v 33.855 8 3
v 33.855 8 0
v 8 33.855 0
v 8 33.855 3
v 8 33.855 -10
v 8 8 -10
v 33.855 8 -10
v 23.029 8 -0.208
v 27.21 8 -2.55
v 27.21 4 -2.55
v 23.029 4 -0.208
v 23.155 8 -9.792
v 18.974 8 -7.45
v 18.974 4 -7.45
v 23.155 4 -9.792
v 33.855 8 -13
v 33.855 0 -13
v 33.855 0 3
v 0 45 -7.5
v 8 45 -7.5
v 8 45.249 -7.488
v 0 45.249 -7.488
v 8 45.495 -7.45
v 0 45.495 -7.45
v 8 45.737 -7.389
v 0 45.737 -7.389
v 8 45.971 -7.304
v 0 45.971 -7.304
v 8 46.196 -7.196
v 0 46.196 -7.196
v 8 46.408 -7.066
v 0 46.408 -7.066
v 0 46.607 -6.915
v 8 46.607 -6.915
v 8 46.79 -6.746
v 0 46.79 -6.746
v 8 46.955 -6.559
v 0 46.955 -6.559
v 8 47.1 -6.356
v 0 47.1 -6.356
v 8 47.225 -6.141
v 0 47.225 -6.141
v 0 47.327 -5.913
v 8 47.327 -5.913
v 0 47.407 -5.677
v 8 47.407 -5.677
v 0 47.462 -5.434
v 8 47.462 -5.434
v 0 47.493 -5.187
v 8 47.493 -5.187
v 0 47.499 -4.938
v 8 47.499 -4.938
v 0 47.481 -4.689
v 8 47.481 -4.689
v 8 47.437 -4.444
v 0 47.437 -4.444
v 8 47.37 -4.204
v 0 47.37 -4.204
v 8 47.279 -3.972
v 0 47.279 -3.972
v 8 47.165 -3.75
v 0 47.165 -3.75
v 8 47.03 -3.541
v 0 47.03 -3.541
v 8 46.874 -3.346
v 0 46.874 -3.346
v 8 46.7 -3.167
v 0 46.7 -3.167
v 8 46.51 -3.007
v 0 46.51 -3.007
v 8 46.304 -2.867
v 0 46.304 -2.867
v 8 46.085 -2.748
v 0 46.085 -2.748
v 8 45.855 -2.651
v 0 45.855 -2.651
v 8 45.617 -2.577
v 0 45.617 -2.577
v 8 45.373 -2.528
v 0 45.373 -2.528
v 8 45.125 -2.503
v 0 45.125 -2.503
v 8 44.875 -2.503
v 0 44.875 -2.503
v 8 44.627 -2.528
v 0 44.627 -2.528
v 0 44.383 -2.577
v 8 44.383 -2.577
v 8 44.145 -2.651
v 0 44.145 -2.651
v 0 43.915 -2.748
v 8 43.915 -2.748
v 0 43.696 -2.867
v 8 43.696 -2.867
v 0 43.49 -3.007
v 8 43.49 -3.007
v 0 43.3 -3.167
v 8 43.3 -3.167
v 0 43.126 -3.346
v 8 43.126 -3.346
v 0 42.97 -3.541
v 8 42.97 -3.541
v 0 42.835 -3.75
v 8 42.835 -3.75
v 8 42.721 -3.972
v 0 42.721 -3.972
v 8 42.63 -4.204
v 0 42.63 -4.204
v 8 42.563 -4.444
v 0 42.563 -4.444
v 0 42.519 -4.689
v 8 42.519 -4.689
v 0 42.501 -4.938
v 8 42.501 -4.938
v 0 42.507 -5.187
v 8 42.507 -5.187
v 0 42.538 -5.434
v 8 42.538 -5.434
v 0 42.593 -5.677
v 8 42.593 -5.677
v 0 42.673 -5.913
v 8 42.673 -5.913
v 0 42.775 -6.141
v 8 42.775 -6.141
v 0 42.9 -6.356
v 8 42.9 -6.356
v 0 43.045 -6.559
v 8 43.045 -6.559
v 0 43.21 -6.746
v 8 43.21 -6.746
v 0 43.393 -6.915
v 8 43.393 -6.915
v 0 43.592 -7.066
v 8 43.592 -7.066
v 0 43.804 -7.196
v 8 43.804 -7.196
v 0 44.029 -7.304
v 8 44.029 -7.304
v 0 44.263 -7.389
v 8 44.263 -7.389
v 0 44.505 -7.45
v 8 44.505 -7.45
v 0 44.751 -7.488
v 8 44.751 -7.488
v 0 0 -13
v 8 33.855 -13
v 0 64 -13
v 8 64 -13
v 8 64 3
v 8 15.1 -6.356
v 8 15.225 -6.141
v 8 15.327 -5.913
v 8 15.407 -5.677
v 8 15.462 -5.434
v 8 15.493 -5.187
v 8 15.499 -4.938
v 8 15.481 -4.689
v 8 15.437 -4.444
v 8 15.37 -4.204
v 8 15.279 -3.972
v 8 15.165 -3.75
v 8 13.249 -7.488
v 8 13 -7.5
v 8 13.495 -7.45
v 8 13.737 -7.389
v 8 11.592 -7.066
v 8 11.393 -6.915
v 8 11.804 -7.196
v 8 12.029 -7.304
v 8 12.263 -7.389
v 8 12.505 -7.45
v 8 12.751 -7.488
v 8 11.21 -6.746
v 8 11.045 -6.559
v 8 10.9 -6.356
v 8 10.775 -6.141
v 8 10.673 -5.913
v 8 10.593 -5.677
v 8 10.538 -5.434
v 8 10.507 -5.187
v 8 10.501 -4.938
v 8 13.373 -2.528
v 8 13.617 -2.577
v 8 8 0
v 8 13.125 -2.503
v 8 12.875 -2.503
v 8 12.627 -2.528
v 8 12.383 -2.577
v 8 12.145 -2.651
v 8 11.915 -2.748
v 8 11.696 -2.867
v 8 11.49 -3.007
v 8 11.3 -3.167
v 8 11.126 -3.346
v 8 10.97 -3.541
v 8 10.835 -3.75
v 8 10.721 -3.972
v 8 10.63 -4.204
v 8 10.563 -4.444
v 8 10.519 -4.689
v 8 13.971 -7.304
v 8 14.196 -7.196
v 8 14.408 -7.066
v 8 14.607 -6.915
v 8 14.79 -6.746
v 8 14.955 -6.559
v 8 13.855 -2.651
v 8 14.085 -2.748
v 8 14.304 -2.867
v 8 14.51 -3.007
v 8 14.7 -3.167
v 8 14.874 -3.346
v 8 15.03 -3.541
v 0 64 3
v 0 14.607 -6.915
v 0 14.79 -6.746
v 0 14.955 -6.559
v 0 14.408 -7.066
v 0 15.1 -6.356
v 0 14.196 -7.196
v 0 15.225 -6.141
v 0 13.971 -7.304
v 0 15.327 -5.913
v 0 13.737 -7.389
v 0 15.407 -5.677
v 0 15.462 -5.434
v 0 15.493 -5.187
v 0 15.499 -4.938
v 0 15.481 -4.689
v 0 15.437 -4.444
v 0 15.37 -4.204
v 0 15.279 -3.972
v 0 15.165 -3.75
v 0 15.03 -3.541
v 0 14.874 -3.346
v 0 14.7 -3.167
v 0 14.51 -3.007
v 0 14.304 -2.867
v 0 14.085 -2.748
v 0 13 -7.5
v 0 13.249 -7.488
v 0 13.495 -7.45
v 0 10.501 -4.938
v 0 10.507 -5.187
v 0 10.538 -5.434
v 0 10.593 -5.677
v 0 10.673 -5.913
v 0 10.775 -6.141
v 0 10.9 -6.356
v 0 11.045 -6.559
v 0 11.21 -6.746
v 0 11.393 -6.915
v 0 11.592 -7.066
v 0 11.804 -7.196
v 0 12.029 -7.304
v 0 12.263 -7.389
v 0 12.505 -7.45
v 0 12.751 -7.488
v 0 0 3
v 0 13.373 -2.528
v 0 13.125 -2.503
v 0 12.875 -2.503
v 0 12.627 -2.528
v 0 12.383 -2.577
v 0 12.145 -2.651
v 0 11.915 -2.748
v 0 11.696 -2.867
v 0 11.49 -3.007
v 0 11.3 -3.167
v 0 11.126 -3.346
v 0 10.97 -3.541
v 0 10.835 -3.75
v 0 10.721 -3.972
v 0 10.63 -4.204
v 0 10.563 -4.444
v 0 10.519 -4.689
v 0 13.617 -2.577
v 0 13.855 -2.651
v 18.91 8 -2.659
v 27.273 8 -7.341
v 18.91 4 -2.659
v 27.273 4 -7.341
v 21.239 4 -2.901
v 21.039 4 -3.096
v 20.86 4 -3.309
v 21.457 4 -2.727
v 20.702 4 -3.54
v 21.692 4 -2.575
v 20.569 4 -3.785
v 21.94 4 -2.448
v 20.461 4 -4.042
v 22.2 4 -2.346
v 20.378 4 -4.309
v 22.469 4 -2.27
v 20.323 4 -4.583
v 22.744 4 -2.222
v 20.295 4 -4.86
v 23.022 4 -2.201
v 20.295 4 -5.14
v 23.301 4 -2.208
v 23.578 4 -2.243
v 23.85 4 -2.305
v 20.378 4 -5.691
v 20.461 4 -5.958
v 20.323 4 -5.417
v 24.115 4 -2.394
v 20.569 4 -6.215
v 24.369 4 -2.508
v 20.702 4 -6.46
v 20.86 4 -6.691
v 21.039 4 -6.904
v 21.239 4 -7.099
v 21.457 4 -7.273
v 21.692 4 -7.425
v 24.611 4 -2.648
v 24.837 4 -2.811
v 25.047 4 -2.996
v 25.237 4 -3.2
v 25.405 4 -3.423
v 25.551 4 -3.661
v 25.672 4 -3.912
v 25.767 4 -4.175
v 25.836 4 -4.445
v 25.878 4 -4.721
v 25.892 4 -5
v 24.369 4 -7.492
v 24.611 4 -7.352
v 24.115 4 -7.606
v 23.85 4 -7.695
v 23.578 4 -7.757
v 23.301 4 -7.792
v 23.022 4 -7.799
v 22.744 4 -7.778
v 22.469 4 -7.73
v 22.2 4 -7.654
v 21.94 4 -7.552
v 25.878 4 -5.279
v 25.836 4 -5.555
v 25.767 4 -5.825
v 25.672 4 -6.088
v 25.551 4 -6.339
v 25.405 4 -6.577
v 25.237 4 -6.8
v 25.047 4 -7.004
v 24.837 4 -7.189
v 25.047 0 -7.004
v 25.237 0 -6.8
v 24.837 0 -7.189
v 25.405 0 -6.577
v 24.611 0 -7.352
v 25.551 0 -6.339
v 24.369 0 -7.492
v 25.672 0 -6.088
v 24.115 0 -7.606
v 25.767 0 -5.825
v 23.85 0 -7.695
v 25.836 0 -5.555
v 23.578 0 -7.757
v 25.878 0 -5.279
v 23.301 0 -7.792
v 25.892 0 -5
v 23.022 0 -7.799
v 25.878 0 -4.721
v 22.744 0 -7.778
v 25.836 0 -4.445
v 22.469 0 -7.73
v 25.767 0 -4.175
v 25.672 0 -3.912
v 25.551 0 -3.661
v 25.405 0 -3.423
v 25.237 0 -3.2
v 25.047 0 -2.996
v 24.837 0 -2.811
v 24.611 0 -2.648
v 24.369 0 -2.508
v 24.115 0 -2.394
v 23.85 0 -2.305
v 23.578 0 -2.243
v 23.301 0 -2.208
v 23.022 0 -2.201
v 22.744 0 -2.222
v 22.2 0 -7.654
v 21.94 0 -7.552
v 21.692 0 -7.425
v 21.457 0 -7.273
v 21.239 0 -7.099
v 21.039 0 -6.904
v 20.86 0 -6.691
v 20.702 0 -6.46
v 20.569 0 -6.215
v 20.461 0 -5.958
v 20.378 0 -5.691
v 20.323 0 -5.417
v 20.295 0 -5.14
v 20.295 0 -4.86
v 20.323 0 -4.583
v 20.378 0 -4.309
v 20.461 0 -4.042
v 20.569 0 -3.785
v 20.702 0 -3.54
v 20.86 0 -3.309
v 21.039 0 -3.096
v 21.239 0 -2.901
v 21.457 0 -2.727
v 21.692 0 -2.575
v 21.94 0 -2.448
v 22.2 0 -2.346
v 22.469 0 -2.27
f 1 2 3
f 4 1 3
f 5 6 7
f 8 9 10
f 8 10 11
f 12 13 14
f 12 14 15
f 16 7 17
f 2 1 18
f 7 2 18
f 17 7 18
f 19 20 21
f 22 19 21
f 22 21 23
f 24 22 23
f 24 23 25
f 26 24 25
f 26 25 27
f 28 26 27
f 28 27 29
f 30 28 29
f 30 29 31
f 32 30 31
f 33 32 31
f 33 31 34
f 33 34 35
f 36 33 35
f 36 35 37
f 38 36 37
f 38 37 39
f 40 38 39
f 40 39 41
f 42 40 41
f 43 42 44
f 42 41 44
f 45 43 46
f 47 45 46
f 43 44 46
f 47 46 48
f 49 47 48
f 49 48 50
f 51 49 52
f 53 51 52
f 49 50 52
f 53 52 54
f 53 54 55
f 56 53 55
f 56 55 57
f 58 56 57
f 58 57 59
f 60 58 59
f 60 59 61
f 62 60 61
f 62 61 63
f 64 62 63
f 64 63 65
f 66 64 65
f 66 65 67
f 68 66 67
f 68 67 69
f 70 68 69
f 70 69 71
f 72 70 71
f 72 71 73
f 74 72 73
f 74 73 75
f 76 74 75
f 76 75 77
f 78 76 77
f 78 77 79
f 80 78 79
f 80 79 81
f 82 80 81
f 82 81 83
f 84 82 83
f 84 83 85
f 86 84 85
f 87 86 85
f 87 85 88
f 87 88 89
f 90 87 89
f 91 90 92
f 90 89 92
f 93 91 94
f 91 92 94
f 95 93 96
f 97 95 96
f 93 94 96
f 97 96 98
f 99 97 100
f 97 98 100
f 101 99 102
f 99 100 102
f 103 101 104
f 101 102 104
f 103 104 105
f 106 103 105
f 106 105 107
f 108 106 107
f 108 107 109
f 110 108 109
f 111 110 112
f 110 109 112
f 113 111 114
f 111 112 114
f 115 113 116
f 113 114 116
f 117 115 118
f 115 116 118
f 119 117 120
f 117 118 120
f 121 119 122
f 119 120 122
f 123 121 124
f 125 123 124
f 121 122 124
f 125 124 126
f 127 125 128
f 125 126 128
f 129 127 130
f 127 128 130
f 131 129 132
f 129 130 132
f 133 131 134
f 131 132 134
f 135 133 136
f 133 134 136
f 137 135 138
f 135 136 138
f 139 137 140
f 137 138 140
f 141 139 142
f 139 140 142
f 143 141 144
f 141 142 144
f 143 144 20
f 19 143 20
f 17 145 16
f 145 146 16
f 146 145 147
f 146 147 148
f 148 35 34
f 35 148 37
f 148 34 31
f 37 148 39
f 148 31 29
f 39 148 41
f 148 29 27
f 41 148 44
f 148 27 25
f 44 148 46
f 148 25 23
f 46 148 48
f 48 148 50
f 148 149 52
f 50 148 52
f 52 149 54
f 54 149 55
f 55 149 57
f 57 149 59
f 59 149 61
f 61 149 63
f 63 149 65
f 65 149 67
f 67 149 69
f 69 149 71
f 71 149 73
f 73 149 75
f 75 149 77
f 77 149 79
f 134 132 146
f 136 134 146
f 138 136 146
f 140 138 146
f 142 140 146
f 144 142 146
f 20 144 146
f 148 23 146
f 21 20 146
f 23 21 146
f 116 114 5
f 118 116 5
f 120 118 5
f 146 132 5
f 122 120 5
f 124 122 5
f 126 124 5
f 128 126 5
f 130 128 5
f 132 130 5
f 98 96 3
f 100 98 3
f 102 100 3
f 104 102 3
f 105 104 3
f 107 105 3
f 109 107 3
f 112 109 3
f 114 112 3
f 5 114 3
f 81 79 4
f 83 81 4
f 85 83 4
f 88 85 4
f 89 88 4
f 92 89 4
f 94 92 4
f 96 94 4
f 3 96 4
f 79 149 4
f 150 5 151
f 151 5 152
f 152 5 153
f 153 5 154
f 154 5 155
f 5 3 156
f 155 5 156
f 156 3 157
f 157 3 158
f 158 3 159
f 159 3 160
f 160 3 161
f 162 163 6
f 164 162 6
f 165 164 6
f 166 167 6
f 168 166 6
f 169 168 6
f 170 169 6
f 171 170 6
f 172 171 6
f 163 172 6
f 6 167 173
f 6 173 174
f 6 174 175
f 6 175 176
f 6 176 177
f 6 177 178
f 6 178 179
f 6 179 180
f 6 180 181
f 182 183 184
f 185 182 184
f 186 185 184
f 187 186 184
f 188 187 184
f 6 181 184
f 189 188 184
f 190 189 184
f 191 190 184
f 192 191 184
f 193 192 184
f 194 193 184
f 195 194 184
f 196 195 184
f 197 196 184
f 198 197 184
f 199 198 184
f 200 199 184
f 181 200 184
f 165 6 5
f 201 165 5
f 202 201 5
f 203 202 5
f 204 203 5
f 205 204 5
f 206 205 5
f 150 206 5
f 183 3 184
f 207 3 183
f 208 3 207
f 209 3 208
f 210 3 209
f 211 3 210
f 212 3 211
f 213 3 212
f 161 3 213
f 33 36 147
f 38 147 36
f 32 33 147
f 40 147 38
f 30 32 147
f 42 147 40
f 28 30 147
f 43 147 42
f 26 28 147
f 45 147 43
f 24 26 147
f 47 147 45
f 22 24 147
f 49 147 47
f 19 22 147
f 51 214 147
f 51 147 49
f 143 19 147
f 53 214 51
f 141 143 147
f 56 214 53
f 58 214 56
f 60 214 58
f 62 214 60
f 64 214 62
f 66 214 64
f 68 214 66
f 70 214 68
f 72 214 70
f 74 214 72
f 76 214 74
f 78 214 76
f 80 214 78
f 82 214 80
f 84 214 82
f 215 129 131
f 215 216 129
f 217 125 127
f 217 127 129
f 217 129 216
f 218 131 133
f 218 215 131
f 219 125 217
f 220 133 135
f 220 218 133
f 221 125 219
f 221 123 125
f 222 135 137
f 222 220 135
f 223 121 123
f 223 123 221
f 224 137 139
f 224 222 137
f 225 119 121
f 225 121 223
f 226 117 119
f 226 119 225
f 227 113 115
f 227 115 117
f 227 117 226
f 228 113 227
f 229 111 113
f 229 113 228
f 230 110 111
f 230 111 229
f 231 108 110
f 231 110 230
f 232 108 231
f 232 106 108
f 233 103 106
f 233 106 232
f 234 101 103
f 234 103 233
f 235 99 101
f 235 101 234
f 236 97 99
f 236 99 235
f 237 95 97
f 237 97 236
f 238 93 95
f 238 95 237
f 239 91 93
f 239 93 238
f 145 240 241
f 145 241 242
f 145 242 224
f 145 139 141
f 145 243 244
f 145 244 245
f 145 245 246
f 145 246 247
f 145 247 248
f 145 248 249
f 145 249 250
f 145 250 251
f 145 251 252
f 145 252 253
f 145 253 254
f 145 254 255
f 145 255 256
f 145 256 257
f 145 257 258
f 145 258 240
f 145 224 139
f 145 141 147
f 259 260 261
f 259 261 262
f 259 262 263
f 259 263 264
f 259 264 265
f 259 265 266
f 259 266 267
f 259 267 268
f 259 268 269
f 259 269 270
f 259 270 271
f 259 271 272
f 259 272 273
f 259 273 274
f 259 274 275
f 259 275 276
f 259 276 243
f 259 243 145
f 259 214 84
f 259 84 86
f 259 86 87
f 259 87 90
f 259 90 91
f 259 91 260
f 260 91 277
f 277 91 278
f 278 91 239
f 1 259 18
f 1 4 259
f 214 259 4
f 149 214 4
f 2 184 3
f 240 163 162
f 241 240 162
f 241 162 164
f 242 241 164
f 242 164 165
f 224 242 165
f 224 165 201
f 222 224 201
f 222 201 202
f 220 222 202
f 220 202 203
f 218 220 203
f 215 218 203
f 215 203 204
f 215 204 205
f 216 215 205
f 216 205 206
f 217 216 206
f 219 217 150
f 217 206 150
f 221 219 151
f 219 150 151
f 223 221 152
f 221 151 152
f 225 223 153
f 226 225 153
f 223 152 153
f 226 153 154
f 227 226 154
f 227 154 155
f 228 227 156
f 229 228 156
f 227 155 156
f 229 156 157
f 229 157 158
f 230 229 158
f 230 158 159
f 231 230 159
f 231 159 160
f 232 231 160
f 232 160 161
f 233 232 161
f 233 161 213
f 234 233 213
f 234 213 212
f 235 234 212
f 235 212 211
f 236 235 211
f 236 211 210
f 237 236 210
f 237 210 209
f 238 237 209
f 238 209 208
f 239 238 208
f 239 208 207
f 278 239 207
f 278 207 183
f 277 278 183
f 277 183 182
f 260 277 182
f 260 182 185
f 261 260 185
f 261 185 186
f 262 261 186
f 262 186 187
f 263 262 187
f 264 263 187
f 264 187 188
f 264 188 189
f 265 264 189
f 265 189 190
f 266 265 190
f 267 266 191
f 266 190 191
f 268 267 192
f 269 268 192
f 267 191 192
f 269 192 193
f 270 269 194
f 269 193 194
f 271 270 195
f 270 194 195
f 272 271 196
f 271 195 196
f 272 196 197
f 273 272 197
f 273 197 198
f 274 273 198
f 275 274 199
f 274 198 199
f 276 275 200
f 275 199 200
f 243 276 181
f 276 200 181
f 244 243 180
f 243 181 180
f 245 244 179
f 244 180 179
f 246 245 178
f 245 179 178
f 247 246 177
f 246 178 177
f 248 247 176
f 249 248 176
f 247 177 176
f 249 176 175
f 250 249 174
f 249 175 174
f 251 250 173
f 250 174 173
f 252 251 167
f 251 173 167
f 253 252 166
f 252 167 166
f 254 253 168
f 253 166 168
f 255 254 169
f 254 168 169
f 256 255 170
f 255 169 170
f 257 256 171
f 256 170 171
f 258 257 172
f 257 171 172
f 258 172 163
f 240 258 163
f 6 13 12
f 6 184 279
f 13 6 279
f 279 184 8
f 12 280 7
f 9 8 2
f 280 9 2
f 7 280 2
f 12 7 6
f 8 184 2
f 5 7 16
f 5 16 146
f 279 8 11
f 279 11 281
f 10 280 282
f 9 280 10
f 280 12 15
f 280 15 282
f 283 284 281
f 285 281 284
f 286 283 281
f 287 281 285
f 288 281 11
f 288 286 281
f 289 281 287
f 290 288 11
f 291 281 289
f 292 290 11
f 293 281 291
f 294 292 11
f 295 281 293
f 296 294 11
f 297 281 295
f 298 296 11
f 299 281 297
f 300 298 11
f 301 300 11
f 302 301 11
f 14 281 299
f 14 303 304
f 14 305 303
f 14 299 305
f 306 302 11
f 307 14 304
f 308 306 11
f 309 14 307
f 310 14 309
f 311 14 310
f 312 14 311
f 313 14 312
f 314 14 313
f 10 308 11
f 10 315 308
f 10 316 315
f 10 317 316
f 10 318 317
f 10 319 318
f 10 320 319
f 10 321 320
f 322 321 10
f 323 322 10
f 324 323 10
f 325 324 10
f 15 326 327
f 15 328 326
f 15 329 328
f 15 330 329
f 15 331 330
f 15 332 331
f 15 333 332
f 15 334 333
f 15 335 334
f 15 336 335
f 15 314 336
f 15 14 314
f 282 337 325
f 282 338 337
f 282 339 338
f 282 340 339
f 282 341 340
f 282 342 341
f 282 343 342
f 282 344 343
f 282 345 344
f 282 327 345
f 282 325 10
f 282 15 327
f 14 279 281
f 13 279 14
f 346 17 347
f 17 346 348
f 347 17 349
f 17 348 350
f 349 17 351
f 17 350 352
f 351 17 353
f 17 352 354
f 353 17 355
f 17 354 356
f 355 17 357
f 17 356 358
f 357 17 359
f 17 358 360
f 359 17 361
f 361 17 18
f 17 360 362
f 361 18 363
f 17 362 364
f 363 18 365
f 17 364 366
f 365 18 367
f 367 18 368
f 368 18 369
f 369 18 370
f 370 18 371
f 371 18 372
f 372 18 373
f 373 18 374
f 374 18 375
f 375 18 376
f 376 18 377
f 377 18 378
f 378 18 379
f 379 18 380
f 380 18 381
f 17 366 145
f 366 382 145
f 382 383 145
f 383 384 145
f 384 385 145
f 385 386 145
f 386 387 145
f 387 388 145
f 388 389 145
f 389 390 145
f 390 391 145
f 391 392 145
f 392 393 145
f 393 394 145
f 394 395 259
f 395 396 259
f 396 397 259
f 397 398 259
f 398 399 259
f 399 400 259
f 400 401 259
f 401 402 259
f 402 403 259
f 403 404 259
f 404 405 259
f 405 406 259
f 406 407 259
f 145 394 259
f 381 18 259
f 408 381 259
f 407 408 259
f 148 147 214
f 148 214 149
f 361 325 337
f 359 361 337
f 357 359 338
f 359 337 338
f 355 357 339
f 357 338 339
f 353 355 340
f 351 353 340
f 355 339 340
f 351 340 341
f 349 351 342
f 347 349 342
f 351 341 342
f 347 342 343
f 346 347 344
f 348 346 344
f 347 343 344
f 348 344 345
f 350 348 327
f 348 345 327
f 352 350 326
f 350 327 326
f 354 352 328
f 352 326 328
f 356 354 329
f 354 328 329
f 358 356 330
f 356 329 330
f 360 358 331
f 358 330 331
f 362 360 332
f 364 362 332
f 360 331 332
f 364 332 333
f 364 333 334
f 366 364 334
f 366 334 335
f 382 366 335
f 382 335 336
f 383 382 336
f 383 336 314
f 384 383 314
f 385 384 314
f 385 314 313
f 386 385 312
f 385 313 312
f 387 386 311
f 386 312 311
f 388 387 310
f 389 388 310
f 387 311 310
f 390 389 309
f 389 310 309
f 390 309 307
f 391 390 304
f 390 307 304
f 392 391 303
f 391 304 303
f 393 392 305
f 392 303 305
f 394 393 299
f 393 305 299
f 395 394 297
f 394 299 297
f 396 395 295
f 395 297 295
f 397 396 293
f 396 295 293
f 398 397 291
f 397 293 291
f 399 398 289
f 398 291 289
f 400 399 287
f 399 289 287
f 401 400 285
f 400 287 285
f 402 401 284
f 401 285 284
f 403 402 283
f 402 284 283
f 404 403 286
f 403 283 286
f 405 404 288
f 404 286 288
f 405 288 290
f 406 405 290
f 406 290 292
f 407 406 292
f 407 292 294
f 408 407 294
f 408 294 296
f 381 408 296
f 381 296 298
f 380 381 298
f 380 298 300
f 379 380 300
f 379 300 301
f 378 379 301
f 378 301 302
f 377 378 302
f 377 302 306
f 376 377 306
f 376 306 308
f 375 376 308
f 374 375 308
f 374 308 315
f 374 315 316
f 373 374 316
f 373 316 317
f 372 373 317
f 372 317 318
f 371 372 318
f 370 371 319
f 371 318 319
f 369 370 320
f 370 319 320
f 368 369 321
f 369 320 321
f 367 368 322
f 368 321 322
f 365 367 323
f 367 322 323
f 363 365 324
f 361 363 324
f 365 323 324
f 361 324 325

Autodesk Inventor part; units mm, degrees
ref_plane "YZ Plane" through (0, 0, 0) normal (1, 0, 0) x (0, 1, 0)
ref_plane "XZ Plane" through (0, 0, 0) normal (0, 1, 0) x (-1, 0, 0)
ref_plane "XY Plane" through (0, 0, 0) normal (0, 0, 1) x (1, 0, 0)
sketch "Sketch1" plane through (0, 0, 0) normal (0, 0, 1) x (1, 0, 0)
  line L0 (0, 64) -> (0, 0)
  line L1 (24.8907, 0) -> (21.3073, 0)
  line L2 (0, 64) -> (8, 64)
  line L3 (33.8546, 8) -> (33.8546, 0)
  line L4 (33.8546, 0) -> (0, 0)
  line L5 (0, 0) -> (0, 64)
  line L6 (8, 64) -> (8, 8)
  line L7 (8, 8) -> (33.8546, 8)
  line L8 (33.8546, 8) -> (8, 33.8546)
  line L9 (33.8546, 8) -> (70.4186, 8) construction
  point P0 (0, 0)
  dimension "d0" = 8
  dimension "d1" = 8
  dimension "d2" = 135
  dimension "d9" = 64
extrude "Extrusion1" add sketch "Sketch1" along normal blind 3
extrude "Extrusion2" add sketch "Sketch1" against normal blind 10 contours L2 L6 L7 L3 L4 L1 L0
extrude "Extrusion3" add sketch "Sketch1" against normal blind 3 from surface at -10
sketch "Sketch2" plane through (8, 33.8546, 3) normal (1, 0, 0) x (0, 0, -1)
  circle A0 centre (8, 11.1454) radius 2.5
  circle A1 centre (8, -20.8546) radius 2.5
  line L0 (16, 30.1454) -> (0, 30.1454) projected
  line L1 (8, 30.1454) -> (8, -25.8546) construction
  line L2 (3, -25.8546) -> (13, -25.8546) construction
  point P0 (3, -33.8546)
  dimension "d20" = 32
  dimension "d21" = 19
extrude "Extrusion4" cut sketch "Sketch2" against normal through all
sketch "Sketch3" plane through (8, 8, 0) normal (0, 1, 0) x (1, 0, 0)
  circle A0 centre (15.0917, 5) radius 2.8
  line L0 (0, 0) -> (0, 10) projected
  line L1 (0, 7.5) -> (0, 2.5) construction
  line L2 (0, 5) -> (22.225, 5) construction
  line L3 (0, 5) -> (22.225, 5) construction
  line L4 (10.9735, 7.4504) -> (15.1547, 9.7916)
  line L5 (15.1547, 9.7916) -> (19.2728, 7.3412)
  line L6 (19.2728, 7.3412) -> (19.2098, 2.5496)
  line L7 (19.2098, 2.5496) -> (15.0287, 0.2084)
  line L8 (15.0287, 0.2084) -> (10.9105, 2.6588)
  line L9 (10.9105, 2.6588) -> (10.9735, 7.4504)
  point P0 (-8, 0)
  dimension "d13" = 5.6
  dimension "d14" = 0
  dimension "d22" = 8.3
extrude "Extrusion5" cut sketch "Sketch3" against normal through all contours A0
extrude "Extrusion7" cut sketch "Sketch3" against normal blind 4 contours A0 | L4 L5 L6 L7 L8 L9
equation "\"d1\" = d0"
properties part number "Lower Limit Switch"
